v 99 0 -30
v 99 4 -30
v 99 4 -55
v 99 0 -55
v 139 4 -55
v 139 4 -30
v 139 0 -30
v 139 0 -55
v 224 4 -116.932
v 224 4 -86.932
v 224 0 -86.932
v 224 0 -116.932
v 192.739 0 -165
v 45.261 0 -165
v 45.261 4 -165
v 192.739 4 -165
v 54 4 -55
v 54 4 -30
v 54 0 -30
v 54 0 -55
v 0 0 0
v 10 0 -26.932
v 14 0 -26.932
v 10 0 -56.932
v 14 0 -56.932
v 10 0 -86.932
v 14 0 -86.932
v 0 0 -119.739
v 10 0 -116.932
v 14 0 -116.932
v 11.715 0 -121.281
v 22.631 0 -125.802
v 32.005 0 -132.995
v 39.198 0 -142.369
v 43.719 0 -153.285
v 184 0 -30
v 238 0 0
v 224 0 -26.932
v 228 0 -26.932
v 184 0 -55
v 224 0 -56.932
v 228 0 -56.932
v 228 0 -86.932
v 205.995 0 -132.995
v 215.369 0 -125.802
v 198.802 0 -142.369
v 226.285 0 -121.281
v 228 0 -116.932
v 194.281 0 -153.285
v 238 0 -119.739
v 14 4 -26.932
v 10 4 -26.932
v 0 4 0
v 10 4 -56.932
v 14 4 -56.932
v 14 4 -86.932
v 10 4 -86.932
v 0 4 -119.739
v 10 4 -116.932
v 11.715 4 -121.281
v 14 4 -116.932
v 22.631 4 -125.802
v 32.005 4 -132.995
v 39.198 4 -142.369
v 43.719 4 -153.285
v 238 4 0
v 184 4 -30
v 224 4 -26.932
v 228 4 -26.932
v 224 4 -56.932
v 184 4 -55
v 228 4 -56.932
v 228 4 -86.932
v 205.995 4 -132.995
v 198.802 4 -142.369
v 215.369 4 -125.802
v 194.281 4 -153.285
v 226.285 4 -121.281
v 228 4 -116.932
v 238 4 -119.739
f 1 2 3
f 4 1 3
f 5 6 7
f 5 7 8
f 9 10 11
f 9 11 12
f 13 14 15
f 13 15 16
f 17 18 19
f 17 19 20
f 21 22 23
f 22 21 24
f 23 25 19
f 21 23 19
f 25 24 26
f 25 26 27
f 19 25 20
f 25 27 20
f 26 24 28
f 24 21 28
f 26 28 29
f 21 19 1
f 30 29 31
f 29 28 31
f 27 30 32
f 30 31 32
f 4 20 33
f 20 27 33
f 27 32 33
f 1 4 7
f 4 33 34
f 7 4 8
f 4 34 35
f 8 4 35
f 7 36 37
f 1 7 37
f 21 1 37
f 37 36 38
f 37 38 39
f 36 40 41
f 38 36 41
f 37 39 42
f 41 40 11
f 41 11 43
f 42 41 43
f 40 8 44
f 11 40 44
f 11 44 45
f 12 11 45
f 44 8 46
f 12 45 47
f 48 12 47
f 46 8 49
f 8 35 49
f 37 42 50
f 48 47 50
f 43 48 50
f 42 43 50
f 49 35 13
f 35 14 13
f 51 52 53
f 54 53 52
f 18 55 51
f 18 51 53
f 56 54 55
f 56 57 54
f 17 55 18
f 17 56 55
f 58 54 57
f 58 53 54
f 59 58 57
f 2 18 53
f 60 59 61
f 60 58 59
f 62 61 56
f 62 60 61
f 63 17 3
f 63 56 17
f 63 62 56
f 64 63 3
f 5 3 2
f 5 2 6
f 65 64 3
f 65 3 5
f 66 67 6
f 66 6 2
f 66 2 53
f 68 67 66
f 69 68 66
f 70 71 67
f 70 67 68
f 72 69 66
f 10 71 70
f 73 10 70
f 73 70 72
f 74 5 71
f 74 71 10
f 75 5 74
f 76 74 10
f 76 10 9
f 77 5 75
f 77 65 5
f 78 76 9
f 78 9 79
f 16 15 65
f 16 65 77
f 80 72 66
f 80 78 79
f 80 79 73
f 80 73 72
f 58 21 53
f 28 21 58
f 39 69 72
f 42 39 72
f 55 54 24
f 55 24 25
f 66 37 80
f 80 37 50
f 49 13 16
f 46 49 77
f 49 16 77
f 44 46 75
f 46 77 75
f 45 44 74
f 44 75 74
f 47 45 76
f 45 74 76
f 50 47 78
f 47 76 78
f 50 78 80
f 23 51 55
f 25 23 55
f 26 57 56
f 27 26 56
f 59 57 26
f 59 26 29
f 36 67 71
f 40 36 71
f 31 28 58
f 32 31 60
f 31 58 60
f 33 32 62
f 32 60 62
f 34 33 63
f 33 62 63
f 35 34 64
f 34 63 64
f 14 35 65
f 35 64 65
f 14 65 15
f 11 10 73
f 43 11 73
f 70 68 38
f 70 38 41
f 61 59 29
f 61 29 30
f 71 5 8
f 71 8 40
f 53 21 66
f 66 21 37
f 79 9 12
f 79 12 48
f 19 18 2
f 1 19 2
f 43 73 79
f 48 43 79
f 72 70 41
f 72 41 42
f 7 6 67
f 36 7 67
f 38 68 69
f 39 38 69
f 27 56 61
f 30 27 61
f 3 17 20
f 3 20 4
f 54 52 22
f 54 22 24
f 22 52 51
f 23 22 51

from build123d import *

# Parameters (mm, degrees)
SKETCH2_W           = 238
SKETCH2_H           = 165
BOSS_EXTRUDE1_DEPTH = 4
SKETCH3_W           = 4
SKETCH3_H           = 30
CUT_EXTRUDE1_DEPTH  = 290.629073126
SKETCH5_R           = 45.261498606
CUT_EXTRUDE3_DEPTH  = 10
SKETCH8_W           = 45
SKETCH8_H           = 25
CUT_EXTRUDE4_DEPTH  = 290.629073126


with BuildPart() as part:
    # Sketch2 → Boss-Extrude1 (new body)
    with BuildSketch(Plane(origin=(0, 0, 0), x_dir=(1, 0, 0), z_dir=(0, 1, 0))):
        with Locations((119, 82.5)):
            Rectangle(SKETCH2_W, SKETCH2_H)
    extrude(amount=BOSS_EXTRUDE1_DEPTH)

    # Sketch3 → Cut-Extrude1 (cut, through all)
    with BuildSketch(Plane(origin=(0, 4, 0), x_dir=(1, 0, 0), z_dir=(0, 1, 0))):
        with Locations((226, 101.931901068)):
            Rectangle(SKETCH3_W, SKETCH3_H)
        with Locations((226, 41.931901068)):
            Rectangle(SKETCH3_W, SKETCH3_H)
        with Locations((12, 101.931901068)):
            Rectangle(SKETCH3_W, SKETCH3_H)
        with Locations((12, 41.931901068)):
            Rectangle(SKETCH3_W, SKETCH3_H)
    extrude(amount=-CUT_EXTRUDE1_DEPTH, mode=Mode.SUBTRACT)

    # Sketch5 → Cut-Extrude3 (cut)
    with BuildSketch(Plane(origin=(0, 4, 0), x_dir=(1, 0, 0), z_dir=(0, 1, 0))):
        with Locations((238, 165)):
            Circle(SKETCH5_R)
        with Locations((0, 165)):
            Circle(SKETCH5_R)
    extrude(amount=-CUT_EXTRUDE3_DEPTH, mode=Mode.SUBTRACT)

    # Sketch8 → Cut-Extrude4 (cut, through all)
    with BuildSketch(Plane(origin=(0, 4, 0), x_dir=(1, 0, 0), z_dir=(0, 1, 0))):
        with Locations((76.5, 42.5)):
            Rectangle(SKETCH8_W, SKETCH8_H)
        with Locations((161.5, 42.5)):
            Rectangle(SKETCH8_W, SKETCH8_H)
    extrude(amount=-CUT_EXTRUDE4_DEPTH, mode=Mode.SUBTRACT)


solid = part.part
